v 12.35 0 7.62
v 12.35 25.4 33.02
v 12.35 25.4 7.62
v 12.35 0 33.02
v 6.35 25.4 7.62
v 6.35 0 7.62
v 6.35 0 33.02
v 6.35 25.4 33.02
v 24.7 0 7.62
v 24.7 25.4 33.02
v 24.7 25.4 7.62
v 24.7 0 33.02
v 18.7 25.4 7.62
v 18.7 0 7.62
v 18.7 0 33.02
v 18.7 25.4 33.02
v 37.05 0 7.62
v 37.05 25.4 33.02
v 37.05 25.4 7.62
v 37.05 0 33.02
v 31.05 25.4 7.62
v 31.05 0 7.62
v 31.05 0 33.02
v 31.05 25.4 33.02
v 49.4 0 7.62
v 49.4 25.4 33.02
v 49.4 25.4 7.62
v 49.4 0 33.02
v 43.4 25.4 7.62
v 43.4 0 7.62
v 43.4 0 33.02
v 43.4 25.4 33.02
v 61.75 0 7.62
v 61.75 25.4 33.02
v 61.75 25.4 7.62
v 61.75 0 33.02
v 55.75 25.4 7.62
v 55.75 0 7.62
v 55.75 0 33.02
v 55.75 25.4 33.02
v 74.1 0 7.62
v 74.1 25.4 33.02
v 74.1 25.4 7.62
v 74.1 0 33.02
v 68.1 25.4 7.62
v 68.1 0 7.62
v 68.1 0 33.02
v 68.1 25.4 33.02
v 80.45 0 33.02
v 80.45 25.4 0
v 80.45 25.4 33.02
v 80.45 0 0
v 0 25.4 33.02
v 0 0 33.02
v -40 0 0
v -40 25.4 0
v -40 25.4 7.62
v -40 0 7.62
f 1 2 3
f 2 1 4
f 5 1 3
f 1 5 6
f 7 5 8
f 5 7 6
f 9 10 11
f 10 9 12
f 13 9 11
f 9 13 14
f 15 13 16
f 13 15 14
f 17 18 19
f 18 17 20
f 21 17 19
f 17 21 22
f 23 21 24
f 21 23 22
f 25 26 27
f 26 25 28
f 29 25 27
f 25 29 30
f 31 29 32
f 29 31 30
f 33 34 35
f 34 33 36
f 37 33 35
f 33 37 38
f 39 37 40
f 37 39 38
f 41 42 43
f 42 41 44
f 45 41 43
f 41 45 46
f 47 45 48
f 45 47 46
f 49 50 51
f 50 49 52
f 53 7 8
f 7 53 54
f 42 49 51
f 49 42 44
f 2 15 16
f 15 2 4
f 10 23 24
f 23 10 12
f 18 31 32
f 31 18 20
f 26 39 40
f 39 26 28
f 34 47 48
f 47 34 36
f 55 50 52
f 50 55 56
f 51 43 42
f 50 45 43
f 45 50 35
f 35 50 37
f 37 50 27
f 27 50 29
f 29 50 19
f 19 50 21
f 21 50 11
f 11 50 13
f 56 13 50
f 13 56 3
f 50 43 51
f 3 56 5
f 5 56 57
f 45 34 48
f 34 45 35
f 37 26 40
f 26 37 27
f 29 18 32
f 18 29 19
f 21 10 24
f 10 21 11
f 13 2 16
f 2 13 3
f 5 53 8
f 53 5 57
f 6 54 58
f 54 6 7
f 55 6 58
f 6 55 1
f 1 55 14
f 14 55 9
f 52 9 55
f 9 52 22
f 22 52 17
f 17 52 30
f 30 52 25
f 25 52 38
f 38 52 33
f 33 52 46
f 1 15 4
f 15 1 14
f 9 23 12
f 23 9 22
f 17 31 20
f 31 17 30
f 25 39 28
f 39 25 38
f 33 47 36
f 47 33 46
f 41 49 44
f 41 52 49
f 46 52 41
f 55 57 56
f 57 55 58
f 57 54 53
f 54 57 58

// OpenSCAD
inch = 25.4;

slot_count = 6;
slot_width = 6;
divider_height = 1 * inch;
divider_thickness = .25 * inch;

base_width = 1 * inch;
base_thickness = .3 * inch;
tail_length = 40;

total_slotted_length = (slot_count * slot_width) + ((slot_count + 1) * divider_thickness);
total_length = total_slotted_length + tail_length;

union() {
    difference() {
        cube([total_slotted_length, base_width, divider_height + base_thickness]);
        
        // Subtracting the slots
        for (i = [0 : slot_count - 1]) {
            translate([divider_thickness + i * (slot_width + divider_thickness), -1, base_thickness])
                cube([slot_width, base_width + 2, divider_height + 1]);
        }
    }

    // Tail section
    translate([-tail_length, 0, 0]) {
        difference() {
            cube([tail_length, base_width, divider_height + base_thickness]);
            
            // Rotating a cube to "cut" the slant
            translate([0, -1, base_thickness])
                rotate([0, -atan((divider_height) / tail_length), 0])
                translate([0, 0, 0])
                cube([tail_length * 1.5, base_width + 2, divider_height * 2]);
        }
    }
}
